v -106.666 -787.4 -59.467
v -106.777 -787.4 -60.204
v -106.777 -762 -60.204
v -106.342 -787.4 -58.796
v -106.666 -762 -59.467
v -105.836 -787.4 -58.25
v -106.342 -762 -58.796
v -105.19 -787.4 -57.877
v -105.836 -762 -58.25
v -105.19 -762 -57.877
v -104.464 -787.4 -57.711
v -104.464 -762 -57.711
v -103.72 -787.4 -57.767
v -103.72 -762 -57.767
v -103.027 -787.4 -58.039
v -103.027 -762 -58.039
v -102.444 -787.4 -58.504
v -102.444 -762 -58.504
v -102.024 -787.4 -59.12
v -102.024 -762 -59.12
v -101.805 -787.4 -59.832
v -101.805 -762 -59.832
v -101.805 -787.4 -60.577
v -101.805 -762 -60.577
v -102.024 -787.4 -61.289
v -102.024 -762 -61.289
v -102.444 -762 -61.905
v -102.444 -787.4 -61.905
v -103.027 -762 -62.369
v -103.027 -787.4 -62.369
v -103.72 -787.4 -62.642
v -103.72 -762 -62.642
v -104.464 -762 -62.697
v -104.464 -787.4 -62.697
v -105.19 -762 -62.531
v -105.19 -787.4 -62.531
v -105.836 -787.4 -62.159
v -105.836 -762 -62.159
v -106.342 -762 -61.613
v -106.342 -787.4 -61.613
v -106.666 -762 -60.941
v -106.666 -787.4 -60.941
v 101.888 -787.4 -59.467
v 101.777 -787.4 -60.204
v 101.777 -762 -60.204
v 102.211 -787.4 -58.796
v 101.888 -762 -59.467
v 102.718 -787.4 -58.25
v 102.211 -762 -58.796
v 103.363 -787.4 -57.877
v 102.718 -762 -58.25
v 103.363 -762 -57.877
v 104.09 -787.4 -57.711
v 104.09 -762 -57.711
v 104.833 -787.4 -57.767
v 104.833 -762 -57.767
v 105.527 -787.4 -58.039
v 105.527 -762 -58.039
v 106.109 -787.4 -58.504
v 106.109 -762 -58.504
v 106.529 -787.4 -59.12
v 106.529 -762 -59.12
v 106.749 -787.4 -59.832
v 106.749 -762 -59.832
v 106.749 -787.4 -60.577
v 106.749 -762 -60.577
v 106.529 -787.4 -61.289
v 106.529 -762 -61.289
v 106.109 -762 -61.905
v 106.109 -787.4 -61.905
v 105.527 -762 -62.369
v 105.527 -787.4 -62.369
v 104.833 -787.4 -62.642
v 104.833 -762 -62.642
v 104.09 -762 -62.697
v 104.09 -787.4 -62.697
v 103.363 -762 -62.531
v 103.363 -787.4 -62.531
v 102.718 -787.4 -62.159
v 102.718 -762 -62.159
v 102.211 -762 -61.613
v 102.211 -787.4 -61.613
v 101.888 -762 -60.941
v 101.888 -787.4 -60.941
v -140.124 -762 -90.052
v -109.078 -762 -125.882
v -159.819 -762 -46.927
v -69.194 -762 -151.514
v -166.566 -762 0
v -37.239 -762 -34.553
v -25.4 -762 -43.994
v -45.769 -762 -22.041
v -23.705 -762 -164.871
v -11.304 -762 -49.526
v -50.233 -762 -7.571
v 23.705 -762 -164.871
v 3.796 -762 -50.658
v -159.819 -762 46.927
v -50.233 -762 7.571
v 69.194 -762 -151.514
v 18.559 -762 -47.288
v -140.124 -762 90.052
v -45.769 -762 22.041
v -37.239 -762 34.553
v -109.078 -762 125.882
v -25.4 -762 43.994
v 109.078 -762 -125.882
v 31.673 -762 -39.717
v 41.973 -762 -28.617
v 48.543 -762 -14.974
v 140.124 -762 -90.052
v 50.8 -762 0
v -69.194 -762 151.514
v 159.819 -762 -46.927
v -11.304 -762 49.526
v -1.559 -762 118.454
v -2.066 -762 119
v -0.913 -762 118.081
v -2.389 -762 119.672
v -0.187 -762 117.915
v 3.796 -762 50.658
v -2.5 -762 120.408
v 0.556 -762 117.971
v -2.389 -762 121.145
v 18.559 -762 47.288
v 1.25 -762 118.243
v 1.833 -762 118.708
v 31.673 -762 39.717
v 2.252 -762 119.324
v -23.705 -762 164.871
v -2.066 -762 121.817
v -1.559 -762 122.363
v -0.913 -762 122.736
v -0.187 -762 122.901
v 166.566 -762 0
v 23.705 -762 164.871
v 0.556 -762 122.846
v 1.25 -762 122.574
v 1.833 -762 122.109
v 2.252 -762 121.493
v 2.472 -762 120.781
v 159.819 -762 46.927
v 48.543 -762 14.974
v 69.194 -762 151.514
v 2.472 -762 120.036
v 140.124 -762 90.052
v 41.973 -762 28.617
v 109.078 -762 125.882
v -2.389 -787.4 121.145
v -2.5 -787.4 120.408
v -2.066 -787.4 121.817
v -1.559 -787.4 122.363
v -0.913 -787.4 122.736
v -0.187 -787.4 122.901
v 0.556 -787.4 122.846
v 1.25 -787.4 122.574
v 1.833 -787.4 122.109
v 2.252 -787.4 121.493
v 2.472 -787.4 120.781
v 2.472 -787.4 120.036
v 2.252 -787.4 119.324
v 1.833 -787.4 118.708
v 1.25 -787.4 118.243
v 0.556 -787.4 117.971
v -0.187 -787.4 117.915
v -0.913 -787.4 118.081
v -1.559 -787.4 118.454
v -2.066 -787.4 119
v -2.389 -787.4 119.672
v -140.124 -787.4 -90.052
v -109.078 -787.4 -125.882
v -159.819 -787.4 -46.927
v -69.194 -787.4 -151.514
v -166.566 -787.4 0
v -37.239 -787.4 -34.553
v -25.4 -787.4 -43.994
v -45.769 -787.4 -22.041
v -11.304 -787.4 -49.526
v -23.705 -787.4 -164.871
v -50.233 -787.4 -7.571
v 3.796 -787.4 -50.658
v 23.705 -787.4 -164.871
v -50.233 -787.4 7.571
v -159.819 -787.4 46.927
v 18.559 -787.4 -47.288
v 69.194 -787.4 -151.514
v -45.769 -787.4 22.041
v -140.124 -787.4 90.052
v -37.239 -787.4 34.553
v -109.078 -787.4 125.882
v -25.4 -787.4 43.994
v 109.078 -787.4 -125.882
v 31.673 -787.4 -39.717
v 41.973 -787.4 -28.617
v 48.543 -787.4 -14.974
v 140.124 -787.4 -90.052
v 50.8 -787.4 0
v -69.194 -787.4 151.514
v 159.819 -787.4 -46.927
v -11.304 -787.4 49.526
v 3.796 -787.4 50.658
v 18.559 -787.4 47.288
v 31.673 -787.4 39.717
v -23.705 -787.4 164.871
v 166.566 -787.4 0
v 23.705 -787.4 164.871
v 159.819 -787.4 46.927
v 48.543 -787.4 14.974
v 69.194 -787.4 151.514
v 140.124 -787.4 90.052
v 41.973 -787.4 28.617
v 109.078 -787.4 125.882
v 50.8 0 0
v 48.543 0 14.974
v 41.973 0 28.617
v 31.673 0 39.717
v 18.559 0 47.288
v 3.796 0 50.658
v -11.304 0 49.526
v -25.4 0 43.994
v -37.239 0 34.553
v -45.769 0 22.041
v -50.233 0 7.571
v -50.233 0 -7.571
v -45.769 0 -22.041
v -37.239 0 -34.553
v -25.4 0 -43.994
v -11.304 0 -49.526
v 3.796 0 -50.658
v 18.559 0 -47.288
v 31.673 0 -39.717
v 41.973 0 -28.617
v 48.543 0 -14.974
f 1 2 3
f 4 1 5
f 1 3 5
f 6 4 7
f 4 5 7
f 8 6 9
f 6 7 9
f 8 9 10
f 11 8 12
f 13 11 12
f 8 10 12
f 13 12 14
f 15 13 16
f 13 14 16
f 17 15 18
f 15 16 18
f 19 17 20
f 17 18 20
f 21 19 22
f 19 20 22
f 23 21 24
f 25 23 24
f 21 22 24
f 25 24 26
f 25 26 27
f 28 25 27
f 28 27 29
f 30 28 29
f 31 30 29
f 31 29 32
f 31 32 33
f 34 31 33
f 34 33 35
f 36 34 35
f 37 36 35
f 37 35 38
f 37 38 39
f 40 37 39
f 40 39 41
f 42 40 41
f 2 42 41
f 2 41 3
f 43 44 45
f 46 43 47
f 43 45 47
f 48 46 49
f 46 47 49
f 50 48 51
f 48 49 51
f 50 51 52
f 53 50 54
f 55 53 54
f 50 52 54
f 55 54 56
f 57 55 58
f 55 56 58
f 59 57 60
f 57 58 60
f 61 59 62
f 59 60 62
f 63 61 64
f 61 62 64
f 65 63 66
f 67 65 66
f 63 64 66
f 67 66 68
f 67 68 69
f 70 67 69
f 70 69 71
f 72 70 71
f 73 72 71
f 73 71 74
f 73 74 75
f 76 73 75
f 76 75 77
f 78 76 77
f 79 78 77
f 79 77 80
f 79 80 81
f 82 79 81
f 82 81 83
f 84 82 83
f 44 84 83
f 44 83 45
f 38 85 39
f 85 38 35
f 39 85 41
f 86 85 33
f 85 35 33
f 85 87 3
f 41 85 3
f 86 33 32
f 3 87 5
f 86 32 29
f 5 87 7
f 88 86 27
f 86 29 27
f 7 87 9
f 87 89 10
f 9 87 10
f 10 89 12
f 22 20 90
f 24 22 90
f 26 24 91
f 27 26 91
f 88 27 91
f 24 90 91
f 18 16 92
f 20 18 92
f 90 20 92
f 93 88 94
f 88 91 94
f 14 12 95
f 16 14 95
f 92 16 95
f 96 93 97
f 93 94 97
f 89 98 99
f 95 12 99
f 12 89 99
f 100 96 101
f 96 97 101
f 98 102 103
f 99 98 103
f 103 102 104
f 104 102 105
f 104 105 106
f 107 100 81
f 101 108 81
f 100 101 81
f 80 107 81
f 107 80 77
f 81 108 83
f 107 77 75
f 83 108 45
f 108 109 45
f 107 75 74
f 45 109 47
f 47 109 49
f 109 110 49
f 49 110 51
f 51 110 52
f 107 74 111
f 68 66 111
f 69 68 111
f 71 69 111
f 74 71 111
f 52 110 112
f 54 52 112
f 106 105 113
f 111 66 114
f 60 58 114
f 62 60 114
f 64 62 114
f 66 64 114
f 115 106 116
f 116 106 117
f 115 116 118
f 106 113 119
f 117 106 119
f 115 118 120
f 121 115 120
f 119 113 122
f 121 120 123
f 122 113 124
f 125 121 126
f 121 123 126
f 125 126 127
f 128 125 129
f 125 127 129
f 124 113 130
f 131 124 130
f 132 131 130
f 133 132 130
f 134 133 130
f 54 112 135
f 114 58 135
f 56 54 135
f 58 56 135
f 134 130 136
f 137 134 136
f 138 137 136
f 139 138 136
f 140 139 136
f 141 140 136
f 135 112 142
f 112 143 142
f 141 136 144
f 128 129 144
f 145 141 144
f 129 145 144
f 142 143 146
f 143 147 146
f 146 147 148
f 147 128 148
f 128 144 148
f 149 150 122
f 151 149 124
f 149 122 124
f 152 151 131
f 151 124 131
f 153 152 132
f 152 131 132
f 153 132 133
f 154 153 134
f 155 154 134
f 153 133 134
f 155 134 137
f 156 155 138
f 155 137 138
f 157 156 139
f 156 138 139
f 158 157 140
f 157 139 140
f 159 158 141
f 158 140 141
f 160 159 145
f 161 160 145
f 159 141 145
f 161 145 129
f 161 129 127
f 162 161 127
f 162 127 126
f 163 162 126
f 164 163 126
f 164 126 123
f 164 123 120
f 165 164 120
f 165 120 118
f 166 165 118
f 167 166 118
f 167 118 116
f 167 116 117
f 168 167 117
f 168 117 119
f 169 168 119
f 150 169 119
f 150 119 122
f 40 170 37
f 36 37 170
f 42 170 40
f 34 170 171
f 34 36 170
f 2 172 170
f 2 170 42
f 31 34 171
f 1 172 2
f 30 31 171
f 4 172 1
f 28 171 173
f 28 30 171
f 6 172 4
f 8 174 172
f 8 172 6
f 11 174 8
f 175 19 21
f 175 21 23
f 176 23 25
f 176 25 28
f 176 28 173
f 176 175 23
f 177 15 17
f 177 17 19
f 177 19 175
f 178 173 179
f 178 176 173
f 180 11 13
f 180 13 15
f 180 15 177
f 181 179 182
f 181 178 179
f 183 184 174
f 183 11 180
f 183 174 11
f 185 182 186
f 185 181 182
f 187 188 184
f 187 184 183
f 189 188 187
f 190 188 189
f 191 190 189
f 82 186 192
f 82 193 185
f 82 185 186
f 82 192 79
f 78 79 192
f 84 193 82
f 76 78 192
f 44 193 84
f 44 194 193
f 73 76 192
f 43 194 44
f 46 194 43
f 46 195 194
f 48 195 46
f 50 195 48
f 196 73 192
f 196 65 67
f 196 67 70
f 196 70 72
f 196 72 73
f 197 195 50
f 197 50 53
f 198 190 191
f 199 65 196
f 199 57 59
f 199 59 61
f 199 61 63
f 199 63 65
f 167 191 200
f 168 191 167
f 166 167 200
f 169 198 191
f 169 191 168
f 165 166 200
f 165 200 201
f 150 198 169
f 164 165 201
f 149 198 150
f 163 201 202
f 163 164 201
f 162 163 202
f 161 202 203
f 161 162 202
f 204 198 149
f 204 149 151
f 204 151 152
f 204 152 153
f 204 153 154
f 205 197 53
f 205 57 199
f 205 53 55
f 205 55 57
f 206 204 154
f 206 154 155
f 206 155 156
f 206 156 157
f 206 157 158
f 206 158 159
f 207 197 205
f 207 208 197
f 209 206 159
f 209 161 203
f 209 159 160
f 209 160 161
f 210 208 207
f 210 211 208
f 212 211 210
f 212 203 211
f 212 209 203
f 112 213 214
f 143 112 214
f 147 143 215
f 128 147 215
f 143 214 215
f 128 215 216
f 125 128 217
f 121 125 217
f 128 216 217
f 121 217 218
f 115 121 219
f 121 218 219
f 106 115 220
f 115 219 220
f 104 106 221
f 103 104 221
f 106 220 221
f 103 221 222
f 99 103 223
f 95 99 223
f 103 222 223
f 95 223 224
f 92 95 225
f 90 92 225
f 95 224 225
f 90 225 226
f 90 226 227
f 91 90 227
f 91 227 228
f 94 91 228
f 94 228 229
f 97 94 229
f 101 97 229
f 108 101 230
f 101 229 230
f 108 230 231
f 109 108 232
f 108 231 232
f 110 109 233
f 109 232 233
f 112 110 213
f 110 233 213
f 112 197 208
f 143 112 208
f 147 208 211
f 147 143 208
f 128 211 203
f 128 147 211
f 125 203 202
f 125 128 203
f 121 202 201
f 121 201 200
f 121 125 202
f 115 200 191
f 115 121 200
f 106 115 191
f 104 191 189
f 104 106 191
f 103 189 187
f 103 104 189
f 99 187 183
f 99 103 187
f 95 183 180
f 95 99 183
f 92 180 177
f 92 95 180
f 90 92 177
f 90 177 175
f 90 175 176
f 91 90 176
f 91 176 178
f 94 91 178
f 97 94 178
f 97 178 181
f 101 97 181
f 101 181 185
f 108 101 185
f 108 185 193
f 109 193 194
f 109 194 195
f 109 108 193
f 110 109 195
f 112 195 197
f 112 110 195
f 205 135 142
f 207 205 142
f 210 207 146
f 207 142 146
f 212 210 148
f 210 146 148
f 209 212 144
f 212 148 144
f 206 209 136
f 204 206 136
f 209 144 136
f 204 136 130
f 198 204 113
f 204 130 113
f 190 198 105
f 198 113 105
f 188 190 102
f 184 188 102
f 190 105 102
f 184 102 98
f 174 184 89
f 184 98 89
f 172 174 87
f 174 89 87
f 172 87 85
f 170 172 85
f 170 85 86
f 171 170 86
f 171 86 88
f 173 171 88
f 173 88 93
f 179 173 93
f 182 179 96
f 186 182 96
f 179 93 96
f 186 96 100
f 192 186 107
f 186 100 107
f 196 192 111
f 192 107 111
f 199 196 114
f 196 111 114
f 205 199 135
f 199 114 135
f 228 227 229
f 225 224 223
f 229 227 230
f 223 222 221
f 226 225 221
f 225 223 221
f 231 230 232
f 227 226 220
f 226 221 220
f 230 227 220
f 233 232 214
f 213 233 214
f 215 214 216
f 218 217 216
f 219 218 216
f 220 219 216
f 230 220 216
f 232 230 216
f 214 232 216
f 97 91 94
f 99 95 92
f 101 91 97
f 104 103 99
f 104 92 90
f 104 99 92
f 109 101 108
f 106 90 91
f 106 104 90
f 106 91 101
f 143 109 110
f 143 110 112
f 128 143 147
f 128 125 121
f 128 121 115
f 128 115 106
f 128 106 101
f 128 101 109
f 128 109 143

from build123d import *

# Parameters (mm, degrees)
F0_R     = 50.8
F1_DEPTH = 762
F2_R     = 166.56616515
F2_R_2   = 50.8
F3_DEPTH = 25.4
F5_D     = 5


with BuildPart() as f1:
    # F0 (on Front) → F1 (new body)
    with BuildSketch(Plane.XZ):
        Circle(F0_R)
    extrude(amount=F1_DEPTH)


with BuildPart() as f3:
    # F2 (on face) → F3 (new body)
    with BuildSketch(Plane.XZ.offset(762)):
        Circle(F2_R)
        Circle(F2_R_2, mode=Mode.SUBTRACT)
    extrude(amount=F3_DEPTH)

    # F5 (through all)
    with Locations(Plane.XZ.offset(787.4)):
        with Locations((0, 120.4084604979), (104.2767856217, -60.2042302489), (-104.2767856217, -60.2042302489)):
            Hole(F5_D / 2)


solid = Compound([f1.part, f3.part])
